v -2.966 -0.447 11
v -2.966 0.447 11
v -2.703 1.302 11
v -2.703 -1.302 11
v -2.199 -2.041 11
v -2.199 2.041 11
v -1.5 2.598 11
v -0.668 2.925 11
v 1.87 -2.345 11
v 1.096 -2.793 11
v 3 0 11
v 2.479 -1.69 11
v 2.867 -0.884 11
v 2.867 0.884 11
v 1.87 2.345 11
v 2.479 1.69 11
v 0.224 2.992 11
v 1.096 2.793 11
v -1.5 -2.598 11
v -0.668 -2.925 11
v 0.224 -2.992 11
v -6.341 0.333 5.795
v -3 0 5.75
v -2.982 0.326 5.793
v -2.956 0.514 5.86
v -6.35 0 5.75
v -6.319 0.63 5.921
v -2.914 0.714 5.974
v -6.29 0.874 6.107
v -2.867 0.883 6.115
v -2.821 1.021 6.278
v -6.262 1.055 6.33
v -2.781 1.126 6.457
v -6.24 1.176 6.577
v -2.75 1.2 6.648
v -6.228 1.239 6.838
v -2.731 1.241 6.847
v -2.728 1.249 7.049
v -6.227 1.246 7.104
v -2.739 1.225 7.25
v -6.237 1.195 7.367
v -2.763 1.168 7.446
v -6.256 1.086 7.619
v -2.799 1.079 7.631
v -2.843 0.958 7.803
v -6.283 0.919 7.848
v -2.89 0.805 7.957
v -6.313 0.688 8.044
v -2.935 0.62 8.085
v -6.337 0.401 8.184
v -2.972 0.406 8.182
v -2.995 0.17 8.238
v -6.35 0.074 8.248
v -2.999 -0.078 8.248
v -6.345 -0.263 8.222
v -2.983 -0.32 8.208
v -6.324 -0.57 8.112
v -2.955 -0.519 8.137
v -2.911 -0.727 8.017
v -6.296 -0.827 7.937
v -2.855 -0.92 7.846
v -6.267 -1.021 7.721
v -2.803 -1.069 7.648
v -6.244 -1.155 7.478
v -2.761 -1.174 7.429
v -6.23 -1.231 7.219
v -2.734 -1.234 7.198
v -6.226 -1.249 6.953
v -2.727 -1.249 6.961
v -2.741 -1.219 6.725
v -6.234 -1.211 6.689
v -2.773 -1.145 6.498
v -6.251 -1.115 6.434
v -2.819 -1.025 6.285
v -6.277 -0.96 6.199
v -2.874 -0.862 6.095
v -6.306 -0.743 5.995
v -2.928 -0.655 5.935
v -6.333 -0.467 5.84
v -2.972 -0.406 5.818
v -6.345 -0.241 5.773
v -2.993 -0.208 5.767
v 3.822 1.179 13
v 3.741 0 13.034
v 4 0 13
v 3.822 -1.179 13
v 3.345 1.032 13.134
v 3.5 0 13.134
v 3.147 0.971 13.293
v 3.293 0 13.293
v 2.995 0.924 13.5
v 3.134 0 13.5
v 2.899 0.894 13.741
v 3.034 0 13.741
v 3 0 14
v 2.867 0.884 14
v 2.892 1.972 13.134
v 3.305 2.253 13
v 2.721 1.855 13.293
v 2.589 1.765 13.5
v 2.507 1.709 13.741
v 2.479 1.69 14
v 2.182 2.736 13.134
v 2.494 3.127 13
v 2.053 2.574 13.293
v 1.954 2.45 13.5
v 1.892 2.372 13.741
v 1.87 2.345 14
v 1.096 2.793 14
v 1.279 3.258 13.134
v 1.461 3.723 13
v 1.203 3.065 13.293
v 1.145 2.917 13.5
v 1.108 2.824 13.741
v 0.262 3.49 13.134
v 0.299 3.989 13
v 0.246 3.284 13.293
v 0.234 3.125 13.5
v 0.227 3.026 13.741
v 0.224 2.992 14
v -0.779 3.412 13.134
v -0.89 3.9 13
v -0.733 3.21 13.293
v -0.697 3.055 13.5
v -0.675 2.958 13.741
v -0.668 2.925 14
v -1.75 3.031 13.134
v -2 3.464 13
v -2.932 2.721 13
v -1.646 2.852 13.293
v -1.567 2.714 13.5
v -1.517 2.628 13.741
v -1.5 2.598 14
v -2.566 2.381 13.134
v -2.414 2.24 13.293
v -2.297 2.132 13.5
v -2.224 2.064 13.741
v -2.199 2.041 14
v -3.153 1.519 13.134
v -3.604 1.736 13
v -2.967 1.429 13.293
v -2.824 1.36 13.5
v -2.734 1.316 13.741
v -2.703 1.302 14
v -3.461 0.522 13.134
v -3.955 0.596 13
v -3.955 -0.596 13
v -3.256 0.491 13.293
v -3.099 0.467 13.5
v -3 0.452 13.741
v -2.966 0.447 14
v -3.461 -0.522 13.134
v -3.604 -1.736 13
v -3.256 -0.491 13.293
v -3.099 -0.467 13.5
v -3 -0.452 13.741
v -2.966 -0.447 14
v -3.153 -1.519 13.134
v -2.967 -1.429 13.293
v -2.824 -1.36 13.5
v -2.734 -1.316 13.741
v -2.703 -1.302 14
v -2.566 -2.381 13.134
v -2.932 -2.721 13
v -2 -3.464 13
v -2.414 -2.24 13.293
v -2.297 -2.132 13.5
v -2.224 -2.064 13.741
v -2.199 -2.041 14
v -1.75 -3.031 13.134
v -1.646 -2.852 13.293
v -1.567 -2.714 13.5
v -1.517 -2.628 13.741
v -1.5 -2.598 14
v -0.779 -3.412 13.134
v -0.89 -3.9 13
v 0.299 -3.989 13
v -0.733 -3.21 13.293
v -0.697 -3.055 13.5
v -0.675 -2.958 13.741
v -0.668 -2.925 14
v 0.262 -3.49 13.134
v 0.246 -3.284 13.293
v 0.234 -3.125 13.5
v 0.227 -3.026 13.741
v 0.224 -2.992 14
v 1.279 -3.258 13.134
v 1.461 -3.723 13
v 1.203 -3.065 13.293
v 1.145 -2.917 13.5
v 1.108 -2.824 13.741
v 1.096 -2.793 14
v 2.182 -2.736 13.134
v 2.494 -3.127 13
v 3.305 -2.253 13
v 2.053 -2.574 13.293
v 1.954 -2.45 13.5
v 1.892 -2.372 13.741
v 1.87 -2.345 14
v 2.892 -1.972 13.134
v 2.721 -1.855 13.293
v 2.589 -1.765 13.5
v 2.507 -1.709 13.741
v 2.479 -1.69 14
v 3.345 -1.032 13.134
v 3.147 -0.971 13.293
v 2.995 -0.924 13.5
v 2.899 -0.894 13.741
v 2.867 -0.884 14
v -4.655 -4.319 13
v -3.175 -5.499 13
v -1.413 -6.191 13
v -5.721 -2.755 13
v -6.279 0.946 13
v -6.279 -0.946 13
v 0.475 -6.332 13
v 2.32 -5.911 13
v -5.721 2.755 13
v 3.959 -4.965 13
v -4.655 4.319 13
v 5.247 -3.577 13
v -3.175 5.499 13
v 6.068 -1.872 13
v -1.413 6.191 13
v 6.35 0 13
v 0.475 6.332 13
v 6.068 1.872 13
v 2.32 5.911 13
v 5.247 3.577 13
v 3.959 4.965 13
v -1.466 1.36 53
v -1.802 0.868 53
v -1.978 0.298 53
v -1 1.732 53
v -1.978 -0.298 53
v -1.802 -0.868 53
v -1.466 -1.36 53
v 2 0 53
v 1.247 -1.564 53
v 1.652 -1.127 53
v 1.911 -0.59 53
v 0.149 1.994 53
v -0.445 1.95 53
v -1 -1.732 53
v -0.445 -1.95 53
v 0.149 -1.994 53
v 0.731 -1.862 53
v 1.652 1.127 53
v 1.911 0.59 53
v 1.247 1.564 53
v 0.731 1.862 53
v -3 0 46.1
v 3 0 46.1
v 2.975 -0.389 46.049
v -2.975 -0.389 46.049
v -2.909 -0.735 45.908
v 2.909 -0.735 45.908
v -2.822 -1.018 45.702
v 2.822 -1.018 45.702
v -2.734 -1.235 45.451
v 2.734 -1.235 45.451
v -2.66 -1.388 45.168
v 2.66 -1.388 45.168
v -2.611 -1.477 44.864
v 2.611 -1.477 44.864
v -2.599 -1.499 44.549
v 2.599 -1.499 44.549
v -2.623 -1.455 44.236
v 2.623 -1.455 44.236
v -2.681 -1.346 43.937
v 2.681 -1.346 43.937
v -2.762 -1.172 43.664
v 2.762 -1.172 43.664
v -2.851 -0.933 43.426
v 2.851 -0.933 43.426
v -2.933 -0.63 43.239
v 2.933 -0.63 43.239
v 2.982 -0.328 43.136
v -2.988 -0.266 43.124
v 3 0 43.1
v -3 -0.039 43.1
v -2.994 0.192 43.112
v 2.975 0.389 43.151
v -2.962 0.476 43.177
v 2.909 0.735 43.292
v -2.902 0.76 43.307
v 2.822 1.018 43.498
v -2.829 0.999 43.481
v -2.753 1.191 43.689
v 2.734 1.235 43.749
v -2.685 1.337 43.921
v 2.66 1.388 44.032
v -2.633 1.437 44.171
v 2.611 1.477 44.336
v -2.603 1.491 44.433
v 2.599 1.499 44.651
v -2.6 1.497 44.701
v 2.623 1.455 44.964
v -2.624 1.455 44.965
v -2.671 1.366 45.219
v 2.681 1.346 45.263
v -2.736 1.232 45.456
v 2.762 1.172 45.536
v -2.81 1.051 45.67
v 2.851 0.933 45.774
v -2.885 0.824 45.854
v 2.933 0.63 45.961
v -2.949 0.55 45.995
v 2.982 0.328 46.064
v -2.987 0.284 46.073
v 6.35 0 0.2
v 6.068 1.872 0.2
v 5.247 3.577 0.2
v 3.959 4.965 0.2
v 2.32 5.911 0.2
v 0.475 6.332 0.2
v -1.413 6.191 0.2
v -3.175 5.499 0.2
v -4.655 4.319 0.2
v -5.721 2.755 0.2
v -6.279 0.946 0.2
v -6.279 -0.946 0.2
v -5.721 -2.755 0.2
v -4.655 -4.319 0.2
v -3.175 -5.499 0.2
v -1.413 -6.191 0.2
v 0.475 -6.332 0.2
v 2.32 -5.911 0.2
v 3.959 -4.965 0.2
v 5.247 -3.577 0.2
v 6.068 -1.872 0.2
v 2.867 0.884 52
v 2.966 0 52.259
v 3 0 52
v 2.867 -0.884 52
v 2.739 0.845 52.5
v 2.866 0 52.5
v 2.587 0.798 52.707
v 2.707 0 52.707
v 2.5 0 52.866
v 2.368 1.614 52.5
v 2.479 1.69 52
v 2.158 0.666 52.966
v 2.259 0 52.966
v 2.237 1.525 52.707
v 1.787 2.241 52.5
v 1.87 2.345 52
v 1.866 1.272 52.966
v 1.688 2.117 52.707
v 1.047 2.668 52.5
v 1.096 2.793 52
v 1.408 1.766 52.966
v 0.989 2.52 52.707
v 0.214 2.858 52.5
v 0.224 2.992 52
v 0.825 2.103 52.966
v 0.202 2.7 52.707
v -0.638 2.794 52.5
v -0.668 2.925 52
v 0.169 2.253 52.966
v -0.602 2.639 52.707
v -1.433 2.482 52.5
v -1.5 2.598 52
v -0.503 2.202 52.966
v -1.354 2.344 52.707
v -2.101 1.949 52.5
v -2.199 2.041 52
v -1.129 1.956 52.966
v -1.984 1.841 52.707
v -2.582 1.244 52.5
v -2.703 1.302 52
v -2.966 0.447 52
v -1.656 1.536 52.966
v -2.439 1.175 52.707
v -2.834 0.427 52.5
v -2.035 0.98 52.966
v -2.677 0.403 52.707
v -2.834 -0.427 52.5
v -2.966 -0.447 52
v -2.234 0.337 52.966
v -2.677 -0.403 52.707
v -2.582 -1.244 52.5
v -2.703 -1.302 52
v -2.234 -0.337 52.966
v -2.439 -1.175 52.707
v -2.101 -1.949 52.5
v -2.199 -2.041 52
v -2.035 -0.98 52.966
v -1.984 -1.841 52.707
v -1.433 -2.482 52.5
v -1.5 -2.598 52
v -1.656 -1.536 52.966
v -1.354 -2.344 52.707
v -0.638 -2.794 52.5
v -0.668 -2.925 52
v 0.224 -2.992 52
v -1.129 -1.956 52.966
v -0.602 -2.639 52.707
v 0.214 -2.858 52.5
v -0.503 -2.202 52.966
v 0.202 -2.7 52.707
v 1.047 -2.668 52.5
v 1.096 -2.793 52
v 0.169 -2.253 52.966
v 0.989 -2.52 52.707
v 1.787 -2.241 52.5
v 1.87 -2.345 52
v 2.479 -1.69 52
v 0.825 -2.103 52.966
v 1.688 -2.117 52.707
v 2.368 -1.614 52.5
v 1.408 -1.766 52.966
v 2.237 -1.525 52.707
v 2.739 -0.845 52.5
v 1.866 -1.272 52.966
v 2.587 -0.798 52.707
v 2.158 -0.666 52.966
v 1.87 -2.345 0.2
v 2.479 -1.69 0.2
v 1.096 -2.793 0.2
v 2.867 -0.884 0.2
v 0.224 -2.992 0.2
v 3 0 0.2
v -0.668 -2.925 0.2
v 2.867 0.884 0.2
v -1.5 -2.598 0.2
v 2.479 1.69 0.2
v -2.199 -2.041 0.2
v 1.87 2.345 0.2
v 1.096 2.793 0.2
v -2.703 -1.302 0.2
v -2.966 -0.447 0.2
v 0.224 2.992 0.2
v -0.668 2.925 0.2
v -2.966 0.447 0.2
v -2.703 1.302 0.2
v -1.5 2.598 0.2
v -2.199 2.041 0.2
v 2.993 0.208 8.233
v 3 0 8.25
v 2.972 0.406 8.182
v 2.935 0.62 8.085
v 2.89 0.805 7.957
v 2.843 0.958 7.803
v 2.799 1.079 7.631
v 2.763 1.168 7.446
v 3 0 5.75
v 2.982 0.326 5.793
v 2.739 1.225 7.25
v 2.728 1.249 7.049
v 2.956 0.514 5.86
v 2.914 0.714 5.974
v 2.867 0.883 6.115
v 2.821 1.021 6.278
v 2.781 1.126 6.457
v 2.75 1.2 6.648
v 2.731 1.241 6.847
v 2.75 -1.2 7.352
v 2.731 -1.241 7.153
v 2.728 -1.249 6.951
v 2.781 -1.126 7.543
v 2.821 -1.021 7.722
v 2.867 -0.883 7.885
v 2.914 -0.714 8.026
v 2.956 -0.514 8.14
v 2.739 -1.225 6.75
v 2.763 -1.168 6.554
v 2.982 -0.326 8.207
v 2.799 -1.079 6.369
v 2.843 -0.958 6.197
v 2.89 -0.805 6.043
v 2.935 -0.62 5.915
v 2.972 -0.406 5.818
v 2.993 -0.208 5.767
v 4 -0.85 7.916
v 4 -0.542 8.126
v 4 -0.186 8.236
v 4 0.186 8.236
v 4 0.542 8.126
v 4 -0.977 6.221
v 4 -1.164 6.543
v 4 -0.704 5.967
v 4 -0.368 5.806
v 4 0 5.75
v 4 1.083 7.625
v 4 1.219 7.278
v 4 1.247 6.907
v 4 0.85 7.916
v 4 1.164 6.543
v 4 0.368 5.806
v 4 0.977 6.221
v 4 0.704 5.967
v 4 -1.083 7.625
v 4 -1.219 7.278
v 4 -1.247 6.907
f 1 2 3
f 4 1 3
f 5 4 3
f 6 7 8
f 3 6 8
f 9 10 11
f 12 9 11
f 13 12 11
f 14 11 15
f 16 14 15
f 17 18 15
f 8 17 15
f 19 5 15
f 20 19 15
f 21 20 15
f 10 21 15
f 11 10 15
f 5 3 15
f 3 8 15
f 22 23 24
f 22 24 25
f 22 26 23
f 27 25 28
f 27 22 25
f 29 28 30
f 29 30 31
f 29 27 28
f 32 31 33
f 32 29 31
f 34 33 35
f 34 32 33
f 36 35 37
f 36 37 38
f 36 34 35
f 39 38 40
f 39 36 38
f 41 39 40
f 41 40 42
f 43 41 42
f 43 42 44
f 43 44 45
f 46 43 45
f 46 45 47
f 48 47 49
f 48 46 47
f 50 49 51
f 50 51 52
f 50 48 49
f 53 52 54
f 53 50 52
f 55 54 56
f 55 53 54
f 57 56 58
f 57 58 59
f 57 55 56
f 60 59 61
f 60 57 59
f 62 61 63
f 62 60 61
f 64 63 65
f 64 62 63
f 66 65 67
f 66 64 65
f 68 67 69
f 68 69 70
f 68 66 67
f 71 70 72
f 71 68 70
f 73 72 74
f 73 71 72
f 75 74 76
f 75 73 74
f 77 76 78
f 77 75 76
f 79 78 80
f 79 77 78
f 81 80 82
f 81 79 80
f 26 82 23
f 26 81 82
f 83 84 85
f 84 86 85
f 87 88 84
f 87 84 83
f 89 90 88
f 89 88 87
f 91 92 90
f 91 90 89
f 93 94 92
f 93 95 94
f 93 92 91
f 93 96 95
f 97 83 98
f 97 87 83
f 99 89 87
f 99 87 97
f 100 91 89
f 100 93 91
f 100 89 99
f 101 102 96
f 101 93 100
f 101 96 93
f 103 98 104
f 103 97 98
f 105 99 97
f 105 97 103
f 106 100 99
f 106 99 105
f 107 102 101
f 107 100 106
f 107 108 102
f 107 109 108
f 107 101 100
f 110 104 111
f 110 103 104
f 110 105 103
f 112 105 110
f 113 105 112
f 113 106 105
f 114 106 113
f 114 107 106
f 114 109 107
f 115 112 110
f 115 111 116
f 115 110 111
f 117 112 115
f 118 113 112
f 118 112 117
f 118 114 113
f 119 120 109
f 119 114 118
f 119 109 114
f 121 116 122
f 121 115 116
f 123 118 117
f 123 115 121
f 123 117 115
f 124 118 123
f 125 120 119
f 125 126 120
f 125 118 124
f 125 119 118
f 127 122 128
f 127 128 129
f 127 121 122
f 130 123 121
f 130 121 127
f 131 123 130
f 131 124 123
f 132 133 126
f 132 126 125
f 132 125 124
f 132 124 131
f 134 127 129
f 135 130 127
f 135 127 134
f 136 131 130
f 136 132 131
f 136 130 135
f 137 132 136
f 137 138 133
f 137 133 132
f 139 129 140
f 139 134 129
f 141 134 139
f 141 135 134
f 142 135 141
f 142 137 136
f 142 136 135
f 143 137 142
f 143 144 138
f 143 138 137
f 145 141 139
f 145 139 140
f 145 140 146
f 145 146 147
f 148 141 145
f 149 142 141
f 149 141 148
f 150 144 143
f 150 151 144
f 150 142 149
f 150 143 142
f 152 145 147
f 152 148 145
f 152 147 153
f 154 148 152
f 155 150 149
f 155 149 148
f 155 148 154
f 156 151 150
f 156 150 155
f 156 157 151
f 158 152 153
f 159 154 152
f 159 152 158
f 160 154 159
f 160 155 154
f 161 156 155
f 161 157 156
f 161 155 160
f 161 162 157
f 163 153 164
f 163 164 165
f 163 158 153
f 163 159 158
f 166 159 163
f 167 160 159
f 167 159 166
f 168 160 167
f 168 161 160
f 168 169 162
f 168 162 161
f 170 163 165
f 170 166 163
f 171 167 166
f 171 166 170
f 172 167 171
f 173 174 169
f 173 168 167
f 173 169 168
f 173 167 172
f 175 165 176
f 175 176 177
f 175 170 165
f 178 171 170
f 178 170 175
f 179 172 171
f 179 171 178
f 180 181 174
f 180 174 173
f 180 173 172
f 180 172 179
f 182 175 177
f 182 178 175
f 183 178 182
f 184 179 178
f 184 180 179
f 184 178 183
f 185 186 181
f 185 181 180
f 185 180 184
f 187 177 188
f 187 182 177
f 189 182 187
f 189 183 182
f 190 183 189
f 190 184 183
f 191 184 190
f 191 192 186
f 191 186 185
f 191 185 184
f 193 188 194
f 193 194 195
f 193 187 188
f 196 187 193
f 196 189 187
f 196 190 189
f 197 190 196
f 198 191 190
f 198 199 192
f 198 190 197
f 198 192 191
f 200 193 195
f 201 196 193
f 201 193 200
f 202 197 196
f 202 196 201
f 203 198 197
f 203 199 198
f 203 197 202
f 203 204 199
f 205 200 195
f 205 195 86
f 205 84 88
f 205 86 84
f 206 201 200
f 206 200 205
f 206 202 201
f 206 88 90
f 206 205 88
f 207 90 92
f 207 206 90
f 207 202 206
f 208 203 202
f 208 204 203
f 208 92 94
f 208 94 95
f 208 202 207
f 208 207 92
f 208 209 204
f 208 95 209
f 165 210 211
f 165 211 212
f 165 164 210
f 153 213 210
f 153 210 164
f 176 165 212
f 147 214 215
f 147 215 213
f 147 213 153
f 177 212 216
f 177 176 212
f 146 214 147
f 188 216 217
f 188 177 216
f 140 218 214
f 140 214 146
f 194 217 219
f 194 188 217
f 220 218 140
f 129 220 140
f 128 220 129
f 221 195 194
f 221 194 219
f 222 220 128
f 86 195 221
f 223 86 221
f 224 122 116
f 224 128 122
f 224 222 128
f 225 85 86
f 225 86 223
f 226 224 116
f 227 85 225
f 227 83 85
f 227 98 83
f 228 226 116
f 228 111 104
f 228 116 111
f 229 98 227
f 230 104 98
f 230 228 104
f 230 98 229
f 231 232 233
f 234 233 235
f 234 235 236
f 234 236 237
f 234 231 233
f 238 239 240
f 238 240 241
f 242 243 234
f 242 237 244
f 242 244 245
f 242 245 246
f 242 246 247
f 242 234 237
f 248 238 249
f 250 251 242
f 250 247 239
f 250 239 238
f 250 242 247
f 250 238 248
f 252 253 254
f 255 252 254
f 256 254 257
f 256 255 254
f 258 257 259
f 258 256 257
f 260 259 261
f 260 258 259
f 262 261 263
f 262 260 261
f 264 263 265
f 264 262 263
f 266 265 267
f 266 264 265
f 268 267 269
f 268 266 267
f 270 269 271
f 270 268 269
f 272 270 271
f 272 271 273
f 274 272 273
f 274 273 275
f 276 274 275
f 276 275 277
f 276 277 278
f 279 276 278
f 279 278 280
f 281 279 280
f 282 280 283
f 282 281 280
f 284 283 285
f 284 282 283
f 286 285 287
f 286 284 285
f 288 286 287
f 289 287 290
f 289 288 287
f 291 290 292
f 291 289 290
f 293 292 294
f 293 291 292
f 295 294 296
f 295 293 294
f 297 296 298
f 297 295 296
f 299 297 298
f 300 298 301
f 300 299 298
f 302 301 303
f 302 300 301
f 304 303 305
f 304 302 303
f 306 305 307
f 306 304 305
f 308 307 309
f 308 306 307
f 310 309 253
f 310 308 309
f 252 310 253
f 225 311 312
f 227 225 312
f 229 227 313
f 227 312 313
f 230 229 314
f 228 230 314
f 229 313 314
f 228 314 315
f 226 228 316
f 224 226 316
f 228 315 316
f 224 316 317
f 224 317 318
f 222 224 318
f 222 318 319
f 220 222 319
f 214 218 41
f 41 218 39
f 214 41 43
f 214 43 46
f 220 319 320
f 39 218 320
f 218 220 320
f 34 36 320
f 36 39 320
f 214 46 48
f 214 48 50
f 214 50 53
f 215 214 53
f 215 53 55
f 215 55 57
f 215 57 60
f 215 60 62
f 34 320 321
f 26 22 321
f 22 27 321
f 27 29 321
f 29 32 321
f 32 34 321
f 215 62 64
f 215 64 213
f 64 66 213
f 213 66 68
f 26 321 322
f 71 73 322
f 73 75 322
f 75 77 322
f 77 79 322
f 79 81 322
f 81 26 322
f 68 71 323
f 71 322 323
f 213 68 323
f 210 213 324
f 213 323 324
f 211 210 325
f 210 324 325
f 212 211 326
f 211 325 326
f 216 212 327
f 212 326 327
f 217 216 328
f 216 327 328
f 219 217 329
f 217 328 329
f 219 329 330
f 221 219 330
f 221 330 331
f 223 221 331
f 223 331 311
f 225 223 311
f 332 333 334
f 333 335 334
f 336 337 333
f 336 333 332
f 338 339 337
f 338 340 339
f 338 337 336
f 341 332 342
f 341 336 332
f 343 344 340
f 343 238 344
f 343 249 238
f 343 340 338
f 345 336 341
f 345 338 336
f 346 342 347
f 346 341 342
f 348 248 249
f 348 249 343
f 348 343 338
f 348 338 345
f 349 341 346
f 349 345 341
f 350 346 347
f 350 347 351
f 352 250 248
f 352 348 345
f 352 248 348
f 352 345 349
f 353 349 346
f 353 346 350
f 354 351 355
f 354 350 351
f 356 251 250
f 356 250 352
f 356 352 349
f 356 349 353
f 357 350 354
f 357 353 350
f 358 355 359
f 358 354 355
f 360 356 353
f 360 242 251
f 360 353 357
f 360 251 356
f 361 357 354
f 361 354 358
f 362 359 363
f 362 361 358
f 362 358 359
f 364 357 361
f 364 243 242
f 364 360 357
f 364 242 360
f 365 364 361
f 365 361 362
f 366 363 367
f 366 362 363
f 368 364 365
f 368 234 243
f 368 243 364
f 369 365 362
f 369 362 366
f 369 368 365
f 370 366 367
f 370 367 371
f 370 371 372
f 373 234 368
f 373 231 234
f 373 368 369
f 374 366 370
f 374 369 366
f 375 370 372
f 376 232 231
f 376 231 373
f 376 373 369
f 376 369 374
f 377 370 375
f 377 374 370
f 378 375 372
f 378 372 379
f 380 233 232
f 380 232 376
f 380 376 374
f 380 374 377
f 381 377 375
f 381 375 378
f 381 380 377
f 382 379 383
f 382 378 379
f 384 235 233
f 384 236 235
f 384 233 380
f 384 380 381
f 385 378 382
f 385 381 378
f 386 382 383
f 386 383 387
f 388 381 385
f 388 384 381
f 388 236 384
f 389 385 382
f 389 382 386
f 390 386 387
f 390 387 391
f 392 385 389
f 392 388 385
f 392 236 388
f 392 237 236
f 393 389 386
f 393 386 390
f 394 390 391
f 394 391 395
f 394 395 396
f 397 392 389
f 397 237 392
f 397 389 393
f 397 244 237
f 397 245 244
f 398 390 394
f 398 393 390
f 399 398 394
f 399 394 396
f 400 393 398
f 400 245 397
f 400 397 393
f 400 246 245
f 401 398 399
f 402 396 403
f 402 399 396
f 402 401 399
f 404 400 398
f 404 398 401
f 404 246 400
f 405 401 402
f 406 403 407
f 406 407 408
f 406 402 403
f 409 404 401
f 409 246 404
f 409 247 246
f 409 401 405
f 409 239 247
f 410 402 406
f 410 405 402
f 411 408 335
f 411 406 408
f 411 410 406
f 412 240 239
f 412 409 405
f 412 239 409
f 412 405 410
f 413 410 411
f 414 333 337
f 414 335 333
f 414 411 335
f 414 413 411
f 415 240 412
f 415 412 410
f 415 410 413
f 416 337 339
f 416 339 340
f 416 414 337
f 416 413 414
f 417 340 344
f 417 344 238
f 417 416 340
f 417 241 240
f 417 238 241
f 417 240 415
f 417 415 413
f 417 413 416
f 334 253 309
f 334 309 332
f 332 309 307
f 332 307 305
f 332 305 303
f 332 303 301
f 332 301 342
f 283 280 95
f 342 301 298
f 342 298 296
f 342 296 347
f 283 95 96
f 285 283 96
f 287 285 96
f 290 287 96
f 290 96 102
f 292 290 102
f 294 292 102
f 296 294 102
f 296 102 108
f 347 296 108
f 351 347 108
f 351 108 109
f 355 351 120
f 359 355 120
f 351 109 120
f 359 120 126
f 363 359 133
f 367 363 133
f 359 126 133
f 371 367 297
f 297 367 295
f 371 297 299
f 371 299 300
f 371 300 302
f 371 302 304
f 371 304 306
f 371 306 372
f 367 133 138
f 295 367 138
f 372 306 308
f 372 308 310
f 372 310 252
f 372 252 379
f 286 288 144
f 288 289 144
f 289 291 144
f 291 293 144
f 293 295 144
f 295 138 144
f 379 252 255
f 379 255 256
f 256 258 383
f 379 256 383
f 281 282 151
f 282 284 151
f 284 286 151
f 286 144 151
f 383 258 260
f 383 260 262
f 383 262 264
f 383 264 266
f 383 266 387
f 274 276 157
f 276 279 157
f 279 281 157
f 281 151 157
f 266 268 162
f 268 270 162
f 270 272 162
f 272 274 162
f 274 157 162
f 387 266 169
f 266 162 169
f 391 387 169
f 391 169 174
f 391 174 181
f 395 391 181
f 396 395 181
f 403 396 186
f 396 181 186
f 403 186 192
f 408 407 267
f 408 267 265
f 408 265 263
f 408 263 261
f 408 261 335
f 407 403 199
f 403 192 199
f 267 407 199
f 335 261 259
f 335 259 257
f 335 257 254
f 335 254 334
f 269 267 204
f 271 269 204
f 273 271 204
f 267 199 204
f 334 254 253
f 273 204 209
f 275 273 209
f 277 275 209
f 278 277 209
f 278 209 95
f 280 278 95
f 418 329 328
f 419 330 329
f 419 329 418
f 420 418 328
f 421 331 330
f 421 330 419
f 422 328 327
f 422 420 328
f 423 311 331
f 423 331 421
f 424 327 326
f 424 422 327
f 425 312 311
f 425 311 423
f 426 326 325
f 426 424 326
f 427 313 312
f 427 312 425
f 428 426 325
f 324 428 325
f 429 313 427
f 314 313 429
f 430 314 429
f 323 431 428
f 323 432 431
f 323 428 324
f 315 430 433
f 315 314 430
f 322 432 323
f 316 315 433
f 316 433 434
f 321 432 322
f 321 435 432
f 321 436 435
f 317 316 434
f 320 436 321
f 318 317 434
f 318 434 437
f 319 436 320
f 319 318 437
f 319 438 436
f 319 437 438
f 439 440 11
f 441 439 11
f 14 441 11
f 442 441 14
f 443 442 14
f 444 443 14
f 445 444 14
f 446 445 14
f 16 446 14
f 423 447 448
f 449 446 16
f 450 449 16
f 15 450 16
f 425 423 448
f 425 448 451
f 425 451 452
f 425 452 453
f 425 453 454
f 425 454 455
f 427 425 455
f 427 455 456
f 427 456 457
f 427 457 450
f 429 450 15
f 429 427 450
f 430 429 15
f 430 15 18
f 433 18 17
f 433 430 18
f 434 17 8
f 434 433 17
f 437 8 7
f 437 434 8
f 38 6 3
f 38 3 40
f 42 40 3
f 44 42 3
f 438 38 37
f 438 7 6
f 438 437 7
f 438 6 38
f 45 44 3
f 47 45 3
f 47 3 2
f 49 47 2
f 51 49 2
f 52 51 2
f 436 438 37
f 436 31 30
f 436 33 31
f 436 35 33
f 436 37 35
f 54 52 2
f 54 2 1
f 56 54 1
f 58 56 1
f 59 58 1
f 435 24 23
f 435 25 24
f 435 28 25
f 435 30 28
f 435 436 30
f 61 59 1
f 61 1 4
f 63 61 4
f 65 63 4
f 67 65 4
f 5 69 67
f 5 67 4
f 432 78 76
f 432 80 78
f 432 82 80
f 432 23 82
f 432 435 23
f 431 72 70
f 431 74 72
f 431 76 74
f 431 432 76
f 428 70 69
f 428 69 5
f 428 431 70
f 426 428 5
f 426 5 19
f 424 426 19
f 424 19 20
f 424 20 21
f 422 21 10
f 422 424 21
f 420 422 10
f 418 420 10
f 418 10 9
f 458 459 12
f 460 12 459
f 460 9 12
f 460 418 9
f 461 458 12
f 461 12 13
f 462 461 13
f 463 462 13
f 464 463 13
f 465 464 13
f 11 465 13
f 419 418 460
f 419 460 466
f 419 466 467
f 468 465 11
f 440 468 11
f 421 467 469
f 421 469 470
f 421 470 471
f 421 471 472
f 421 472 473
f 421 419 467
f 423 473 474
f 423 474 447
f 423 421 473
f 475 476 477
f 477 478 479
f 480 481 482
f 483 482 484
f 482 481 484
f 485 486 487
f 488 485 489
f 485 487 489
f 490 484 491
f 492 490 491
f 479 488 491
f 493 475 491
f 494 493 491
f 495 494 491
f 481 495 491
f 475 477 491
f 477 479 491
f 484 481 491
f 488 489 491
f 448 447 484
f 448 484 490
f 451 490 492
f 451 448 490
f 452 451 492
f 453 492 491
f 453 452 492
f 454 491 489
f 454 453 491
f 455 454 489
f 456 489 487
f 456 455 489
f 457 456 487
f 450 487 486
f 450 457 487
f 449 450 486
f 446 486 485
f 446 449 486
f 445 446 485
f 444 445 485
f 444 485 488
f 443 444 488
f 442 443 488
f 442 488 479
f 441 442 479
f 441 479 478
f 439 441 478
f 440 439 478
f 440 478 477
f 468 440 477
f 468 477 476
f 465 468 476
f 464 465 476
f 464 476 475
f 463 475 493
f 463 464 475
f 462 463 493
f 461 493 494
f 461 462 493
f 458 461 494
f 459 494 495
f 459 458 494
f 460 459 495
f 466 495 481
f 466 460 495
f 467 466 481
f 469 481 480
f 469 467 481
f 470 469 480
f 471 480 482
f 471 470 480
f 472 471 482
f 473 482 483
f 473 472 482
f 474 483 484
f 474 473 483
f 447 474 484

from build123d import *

# Parameters (mm, degrees)
SKETCH1_R               = 6.35
SKETCH1_R_2             = 3
BOSS_EXTRUDE1_DEPTH     = 11
SKETCH2_R               = 6.35
BOSS_EXTRUDE2_DEPTH     = 2
SKETCH3_R               = 3
BOSS_EXTRUDE3_DEPTH     = 40
CUT_EXTRUDE1_DEPTH      = 4
CUT_EXTRUDE1_DEPTH_BACK = 30
SKETCH4_R               = 1.25
FILLET1_R               = 1
FILLET2_R               = 1
CUT_EXTRUDE2_DEPTH      = 54.755418355
CUT_EXTRUDE2_DEPTH_BACK = 54.755418355
SKETCH5_R               = 1.5
SKETCH6_R               = 6.35
CUT_EXTRUDE3_DEPTH      = 0.2


with BuildPart() as part:
    # Sketch1 → Boss-Extrude1 (new body)
    with BuildSketch(Plane.XY):
        Circle(SKETCH1_R)
        Circle(SKETCH1_R_2, mode=Mode.SUBTRACT)
    extrude(amount=BOSS_EXTRUDE1_DEPTH)

    # Sketch2 → Boss-Extrude2 (add)
    with BuildSketch(Plane.XY.offset(11)):
        Circle(SKETCH2_R)
    extrude(amount=BOSS_EXTRUDE2_DEPTH)

    # Sketch3 → Boss-Extrude3 (add)
    with BuildSketch(Plane.XY.offset(13)):
        Circle(SKETCH3_R)
    extrude(amount=BOSS_EXTRUDE3_DEPTH)

    # Sketch4 → Cut-Extrude1 (cut, two sides: drawn at the far end of the back side and taken through both)
    with BuildSketch(Plane(origin=(0, 0, 0), x_dir=(0, 0, -1), z_dir=(1, 0, 0)).offset(-CUT_EXTRUDE1_DEPTH_BACK)):
        with Locations((-7, 0)):
            Circle(SKETCH4_R)
    extrude(amount=CUT_EXTRUDE1_DEPTH + CUT_EXTRUDE1_DEPTH_BACK, mode=Mode.SUBTRACT)

    # Fillet1
    fillet1_edges = [part.edges().sort_by_distance(p)[0] for p in [
        (-3, 0, 13),
    ]]
    fillet(fillet1_edges, radius=FILLET1_R)

    # Fillet2
    fillet2_edges = [part.edges().sort_by_distance(p)[0] for p in [
        (-3, 0, 53),
    ]]
    fillet(fillet2_edges, radius=FILLET2_R)

    # Sketch5 → Cut-Extrude2 (cut, two sides: drawn at the far end of the back side and taken through both)
    with BuildSketch(Plane(origin=(0, 0, 0), x_dir=(0, 0, -1), z_dir=(1, 0, 0)).offset(-CUT_EXTRUDE2_DEPTH_BACK)):
        with Locations(Location((-44.6, 0, 0), (0, 0, 179.999999999))):
            Circle(SKETCH5_R)
    extrude(amount=CUT_EXTRUDE2_DEPTH + CUT_EXTRUDE2_DEPTH_BACK, mode=Mode.SUBTRACT)

    # Sketch6 → Cut-Extrude3 (cut)
    with BuildSketch(Plane(origin=(0, 0, 0), x_dir=(-1, 0, 0), z_dir=(0, 0, -1))):
        Circle(SKETCH6_R)
    extrude(amount=-CUT_EXTRUDE3_DEPTH, mode=Mode.SUBTRACT)


solid = part.part
